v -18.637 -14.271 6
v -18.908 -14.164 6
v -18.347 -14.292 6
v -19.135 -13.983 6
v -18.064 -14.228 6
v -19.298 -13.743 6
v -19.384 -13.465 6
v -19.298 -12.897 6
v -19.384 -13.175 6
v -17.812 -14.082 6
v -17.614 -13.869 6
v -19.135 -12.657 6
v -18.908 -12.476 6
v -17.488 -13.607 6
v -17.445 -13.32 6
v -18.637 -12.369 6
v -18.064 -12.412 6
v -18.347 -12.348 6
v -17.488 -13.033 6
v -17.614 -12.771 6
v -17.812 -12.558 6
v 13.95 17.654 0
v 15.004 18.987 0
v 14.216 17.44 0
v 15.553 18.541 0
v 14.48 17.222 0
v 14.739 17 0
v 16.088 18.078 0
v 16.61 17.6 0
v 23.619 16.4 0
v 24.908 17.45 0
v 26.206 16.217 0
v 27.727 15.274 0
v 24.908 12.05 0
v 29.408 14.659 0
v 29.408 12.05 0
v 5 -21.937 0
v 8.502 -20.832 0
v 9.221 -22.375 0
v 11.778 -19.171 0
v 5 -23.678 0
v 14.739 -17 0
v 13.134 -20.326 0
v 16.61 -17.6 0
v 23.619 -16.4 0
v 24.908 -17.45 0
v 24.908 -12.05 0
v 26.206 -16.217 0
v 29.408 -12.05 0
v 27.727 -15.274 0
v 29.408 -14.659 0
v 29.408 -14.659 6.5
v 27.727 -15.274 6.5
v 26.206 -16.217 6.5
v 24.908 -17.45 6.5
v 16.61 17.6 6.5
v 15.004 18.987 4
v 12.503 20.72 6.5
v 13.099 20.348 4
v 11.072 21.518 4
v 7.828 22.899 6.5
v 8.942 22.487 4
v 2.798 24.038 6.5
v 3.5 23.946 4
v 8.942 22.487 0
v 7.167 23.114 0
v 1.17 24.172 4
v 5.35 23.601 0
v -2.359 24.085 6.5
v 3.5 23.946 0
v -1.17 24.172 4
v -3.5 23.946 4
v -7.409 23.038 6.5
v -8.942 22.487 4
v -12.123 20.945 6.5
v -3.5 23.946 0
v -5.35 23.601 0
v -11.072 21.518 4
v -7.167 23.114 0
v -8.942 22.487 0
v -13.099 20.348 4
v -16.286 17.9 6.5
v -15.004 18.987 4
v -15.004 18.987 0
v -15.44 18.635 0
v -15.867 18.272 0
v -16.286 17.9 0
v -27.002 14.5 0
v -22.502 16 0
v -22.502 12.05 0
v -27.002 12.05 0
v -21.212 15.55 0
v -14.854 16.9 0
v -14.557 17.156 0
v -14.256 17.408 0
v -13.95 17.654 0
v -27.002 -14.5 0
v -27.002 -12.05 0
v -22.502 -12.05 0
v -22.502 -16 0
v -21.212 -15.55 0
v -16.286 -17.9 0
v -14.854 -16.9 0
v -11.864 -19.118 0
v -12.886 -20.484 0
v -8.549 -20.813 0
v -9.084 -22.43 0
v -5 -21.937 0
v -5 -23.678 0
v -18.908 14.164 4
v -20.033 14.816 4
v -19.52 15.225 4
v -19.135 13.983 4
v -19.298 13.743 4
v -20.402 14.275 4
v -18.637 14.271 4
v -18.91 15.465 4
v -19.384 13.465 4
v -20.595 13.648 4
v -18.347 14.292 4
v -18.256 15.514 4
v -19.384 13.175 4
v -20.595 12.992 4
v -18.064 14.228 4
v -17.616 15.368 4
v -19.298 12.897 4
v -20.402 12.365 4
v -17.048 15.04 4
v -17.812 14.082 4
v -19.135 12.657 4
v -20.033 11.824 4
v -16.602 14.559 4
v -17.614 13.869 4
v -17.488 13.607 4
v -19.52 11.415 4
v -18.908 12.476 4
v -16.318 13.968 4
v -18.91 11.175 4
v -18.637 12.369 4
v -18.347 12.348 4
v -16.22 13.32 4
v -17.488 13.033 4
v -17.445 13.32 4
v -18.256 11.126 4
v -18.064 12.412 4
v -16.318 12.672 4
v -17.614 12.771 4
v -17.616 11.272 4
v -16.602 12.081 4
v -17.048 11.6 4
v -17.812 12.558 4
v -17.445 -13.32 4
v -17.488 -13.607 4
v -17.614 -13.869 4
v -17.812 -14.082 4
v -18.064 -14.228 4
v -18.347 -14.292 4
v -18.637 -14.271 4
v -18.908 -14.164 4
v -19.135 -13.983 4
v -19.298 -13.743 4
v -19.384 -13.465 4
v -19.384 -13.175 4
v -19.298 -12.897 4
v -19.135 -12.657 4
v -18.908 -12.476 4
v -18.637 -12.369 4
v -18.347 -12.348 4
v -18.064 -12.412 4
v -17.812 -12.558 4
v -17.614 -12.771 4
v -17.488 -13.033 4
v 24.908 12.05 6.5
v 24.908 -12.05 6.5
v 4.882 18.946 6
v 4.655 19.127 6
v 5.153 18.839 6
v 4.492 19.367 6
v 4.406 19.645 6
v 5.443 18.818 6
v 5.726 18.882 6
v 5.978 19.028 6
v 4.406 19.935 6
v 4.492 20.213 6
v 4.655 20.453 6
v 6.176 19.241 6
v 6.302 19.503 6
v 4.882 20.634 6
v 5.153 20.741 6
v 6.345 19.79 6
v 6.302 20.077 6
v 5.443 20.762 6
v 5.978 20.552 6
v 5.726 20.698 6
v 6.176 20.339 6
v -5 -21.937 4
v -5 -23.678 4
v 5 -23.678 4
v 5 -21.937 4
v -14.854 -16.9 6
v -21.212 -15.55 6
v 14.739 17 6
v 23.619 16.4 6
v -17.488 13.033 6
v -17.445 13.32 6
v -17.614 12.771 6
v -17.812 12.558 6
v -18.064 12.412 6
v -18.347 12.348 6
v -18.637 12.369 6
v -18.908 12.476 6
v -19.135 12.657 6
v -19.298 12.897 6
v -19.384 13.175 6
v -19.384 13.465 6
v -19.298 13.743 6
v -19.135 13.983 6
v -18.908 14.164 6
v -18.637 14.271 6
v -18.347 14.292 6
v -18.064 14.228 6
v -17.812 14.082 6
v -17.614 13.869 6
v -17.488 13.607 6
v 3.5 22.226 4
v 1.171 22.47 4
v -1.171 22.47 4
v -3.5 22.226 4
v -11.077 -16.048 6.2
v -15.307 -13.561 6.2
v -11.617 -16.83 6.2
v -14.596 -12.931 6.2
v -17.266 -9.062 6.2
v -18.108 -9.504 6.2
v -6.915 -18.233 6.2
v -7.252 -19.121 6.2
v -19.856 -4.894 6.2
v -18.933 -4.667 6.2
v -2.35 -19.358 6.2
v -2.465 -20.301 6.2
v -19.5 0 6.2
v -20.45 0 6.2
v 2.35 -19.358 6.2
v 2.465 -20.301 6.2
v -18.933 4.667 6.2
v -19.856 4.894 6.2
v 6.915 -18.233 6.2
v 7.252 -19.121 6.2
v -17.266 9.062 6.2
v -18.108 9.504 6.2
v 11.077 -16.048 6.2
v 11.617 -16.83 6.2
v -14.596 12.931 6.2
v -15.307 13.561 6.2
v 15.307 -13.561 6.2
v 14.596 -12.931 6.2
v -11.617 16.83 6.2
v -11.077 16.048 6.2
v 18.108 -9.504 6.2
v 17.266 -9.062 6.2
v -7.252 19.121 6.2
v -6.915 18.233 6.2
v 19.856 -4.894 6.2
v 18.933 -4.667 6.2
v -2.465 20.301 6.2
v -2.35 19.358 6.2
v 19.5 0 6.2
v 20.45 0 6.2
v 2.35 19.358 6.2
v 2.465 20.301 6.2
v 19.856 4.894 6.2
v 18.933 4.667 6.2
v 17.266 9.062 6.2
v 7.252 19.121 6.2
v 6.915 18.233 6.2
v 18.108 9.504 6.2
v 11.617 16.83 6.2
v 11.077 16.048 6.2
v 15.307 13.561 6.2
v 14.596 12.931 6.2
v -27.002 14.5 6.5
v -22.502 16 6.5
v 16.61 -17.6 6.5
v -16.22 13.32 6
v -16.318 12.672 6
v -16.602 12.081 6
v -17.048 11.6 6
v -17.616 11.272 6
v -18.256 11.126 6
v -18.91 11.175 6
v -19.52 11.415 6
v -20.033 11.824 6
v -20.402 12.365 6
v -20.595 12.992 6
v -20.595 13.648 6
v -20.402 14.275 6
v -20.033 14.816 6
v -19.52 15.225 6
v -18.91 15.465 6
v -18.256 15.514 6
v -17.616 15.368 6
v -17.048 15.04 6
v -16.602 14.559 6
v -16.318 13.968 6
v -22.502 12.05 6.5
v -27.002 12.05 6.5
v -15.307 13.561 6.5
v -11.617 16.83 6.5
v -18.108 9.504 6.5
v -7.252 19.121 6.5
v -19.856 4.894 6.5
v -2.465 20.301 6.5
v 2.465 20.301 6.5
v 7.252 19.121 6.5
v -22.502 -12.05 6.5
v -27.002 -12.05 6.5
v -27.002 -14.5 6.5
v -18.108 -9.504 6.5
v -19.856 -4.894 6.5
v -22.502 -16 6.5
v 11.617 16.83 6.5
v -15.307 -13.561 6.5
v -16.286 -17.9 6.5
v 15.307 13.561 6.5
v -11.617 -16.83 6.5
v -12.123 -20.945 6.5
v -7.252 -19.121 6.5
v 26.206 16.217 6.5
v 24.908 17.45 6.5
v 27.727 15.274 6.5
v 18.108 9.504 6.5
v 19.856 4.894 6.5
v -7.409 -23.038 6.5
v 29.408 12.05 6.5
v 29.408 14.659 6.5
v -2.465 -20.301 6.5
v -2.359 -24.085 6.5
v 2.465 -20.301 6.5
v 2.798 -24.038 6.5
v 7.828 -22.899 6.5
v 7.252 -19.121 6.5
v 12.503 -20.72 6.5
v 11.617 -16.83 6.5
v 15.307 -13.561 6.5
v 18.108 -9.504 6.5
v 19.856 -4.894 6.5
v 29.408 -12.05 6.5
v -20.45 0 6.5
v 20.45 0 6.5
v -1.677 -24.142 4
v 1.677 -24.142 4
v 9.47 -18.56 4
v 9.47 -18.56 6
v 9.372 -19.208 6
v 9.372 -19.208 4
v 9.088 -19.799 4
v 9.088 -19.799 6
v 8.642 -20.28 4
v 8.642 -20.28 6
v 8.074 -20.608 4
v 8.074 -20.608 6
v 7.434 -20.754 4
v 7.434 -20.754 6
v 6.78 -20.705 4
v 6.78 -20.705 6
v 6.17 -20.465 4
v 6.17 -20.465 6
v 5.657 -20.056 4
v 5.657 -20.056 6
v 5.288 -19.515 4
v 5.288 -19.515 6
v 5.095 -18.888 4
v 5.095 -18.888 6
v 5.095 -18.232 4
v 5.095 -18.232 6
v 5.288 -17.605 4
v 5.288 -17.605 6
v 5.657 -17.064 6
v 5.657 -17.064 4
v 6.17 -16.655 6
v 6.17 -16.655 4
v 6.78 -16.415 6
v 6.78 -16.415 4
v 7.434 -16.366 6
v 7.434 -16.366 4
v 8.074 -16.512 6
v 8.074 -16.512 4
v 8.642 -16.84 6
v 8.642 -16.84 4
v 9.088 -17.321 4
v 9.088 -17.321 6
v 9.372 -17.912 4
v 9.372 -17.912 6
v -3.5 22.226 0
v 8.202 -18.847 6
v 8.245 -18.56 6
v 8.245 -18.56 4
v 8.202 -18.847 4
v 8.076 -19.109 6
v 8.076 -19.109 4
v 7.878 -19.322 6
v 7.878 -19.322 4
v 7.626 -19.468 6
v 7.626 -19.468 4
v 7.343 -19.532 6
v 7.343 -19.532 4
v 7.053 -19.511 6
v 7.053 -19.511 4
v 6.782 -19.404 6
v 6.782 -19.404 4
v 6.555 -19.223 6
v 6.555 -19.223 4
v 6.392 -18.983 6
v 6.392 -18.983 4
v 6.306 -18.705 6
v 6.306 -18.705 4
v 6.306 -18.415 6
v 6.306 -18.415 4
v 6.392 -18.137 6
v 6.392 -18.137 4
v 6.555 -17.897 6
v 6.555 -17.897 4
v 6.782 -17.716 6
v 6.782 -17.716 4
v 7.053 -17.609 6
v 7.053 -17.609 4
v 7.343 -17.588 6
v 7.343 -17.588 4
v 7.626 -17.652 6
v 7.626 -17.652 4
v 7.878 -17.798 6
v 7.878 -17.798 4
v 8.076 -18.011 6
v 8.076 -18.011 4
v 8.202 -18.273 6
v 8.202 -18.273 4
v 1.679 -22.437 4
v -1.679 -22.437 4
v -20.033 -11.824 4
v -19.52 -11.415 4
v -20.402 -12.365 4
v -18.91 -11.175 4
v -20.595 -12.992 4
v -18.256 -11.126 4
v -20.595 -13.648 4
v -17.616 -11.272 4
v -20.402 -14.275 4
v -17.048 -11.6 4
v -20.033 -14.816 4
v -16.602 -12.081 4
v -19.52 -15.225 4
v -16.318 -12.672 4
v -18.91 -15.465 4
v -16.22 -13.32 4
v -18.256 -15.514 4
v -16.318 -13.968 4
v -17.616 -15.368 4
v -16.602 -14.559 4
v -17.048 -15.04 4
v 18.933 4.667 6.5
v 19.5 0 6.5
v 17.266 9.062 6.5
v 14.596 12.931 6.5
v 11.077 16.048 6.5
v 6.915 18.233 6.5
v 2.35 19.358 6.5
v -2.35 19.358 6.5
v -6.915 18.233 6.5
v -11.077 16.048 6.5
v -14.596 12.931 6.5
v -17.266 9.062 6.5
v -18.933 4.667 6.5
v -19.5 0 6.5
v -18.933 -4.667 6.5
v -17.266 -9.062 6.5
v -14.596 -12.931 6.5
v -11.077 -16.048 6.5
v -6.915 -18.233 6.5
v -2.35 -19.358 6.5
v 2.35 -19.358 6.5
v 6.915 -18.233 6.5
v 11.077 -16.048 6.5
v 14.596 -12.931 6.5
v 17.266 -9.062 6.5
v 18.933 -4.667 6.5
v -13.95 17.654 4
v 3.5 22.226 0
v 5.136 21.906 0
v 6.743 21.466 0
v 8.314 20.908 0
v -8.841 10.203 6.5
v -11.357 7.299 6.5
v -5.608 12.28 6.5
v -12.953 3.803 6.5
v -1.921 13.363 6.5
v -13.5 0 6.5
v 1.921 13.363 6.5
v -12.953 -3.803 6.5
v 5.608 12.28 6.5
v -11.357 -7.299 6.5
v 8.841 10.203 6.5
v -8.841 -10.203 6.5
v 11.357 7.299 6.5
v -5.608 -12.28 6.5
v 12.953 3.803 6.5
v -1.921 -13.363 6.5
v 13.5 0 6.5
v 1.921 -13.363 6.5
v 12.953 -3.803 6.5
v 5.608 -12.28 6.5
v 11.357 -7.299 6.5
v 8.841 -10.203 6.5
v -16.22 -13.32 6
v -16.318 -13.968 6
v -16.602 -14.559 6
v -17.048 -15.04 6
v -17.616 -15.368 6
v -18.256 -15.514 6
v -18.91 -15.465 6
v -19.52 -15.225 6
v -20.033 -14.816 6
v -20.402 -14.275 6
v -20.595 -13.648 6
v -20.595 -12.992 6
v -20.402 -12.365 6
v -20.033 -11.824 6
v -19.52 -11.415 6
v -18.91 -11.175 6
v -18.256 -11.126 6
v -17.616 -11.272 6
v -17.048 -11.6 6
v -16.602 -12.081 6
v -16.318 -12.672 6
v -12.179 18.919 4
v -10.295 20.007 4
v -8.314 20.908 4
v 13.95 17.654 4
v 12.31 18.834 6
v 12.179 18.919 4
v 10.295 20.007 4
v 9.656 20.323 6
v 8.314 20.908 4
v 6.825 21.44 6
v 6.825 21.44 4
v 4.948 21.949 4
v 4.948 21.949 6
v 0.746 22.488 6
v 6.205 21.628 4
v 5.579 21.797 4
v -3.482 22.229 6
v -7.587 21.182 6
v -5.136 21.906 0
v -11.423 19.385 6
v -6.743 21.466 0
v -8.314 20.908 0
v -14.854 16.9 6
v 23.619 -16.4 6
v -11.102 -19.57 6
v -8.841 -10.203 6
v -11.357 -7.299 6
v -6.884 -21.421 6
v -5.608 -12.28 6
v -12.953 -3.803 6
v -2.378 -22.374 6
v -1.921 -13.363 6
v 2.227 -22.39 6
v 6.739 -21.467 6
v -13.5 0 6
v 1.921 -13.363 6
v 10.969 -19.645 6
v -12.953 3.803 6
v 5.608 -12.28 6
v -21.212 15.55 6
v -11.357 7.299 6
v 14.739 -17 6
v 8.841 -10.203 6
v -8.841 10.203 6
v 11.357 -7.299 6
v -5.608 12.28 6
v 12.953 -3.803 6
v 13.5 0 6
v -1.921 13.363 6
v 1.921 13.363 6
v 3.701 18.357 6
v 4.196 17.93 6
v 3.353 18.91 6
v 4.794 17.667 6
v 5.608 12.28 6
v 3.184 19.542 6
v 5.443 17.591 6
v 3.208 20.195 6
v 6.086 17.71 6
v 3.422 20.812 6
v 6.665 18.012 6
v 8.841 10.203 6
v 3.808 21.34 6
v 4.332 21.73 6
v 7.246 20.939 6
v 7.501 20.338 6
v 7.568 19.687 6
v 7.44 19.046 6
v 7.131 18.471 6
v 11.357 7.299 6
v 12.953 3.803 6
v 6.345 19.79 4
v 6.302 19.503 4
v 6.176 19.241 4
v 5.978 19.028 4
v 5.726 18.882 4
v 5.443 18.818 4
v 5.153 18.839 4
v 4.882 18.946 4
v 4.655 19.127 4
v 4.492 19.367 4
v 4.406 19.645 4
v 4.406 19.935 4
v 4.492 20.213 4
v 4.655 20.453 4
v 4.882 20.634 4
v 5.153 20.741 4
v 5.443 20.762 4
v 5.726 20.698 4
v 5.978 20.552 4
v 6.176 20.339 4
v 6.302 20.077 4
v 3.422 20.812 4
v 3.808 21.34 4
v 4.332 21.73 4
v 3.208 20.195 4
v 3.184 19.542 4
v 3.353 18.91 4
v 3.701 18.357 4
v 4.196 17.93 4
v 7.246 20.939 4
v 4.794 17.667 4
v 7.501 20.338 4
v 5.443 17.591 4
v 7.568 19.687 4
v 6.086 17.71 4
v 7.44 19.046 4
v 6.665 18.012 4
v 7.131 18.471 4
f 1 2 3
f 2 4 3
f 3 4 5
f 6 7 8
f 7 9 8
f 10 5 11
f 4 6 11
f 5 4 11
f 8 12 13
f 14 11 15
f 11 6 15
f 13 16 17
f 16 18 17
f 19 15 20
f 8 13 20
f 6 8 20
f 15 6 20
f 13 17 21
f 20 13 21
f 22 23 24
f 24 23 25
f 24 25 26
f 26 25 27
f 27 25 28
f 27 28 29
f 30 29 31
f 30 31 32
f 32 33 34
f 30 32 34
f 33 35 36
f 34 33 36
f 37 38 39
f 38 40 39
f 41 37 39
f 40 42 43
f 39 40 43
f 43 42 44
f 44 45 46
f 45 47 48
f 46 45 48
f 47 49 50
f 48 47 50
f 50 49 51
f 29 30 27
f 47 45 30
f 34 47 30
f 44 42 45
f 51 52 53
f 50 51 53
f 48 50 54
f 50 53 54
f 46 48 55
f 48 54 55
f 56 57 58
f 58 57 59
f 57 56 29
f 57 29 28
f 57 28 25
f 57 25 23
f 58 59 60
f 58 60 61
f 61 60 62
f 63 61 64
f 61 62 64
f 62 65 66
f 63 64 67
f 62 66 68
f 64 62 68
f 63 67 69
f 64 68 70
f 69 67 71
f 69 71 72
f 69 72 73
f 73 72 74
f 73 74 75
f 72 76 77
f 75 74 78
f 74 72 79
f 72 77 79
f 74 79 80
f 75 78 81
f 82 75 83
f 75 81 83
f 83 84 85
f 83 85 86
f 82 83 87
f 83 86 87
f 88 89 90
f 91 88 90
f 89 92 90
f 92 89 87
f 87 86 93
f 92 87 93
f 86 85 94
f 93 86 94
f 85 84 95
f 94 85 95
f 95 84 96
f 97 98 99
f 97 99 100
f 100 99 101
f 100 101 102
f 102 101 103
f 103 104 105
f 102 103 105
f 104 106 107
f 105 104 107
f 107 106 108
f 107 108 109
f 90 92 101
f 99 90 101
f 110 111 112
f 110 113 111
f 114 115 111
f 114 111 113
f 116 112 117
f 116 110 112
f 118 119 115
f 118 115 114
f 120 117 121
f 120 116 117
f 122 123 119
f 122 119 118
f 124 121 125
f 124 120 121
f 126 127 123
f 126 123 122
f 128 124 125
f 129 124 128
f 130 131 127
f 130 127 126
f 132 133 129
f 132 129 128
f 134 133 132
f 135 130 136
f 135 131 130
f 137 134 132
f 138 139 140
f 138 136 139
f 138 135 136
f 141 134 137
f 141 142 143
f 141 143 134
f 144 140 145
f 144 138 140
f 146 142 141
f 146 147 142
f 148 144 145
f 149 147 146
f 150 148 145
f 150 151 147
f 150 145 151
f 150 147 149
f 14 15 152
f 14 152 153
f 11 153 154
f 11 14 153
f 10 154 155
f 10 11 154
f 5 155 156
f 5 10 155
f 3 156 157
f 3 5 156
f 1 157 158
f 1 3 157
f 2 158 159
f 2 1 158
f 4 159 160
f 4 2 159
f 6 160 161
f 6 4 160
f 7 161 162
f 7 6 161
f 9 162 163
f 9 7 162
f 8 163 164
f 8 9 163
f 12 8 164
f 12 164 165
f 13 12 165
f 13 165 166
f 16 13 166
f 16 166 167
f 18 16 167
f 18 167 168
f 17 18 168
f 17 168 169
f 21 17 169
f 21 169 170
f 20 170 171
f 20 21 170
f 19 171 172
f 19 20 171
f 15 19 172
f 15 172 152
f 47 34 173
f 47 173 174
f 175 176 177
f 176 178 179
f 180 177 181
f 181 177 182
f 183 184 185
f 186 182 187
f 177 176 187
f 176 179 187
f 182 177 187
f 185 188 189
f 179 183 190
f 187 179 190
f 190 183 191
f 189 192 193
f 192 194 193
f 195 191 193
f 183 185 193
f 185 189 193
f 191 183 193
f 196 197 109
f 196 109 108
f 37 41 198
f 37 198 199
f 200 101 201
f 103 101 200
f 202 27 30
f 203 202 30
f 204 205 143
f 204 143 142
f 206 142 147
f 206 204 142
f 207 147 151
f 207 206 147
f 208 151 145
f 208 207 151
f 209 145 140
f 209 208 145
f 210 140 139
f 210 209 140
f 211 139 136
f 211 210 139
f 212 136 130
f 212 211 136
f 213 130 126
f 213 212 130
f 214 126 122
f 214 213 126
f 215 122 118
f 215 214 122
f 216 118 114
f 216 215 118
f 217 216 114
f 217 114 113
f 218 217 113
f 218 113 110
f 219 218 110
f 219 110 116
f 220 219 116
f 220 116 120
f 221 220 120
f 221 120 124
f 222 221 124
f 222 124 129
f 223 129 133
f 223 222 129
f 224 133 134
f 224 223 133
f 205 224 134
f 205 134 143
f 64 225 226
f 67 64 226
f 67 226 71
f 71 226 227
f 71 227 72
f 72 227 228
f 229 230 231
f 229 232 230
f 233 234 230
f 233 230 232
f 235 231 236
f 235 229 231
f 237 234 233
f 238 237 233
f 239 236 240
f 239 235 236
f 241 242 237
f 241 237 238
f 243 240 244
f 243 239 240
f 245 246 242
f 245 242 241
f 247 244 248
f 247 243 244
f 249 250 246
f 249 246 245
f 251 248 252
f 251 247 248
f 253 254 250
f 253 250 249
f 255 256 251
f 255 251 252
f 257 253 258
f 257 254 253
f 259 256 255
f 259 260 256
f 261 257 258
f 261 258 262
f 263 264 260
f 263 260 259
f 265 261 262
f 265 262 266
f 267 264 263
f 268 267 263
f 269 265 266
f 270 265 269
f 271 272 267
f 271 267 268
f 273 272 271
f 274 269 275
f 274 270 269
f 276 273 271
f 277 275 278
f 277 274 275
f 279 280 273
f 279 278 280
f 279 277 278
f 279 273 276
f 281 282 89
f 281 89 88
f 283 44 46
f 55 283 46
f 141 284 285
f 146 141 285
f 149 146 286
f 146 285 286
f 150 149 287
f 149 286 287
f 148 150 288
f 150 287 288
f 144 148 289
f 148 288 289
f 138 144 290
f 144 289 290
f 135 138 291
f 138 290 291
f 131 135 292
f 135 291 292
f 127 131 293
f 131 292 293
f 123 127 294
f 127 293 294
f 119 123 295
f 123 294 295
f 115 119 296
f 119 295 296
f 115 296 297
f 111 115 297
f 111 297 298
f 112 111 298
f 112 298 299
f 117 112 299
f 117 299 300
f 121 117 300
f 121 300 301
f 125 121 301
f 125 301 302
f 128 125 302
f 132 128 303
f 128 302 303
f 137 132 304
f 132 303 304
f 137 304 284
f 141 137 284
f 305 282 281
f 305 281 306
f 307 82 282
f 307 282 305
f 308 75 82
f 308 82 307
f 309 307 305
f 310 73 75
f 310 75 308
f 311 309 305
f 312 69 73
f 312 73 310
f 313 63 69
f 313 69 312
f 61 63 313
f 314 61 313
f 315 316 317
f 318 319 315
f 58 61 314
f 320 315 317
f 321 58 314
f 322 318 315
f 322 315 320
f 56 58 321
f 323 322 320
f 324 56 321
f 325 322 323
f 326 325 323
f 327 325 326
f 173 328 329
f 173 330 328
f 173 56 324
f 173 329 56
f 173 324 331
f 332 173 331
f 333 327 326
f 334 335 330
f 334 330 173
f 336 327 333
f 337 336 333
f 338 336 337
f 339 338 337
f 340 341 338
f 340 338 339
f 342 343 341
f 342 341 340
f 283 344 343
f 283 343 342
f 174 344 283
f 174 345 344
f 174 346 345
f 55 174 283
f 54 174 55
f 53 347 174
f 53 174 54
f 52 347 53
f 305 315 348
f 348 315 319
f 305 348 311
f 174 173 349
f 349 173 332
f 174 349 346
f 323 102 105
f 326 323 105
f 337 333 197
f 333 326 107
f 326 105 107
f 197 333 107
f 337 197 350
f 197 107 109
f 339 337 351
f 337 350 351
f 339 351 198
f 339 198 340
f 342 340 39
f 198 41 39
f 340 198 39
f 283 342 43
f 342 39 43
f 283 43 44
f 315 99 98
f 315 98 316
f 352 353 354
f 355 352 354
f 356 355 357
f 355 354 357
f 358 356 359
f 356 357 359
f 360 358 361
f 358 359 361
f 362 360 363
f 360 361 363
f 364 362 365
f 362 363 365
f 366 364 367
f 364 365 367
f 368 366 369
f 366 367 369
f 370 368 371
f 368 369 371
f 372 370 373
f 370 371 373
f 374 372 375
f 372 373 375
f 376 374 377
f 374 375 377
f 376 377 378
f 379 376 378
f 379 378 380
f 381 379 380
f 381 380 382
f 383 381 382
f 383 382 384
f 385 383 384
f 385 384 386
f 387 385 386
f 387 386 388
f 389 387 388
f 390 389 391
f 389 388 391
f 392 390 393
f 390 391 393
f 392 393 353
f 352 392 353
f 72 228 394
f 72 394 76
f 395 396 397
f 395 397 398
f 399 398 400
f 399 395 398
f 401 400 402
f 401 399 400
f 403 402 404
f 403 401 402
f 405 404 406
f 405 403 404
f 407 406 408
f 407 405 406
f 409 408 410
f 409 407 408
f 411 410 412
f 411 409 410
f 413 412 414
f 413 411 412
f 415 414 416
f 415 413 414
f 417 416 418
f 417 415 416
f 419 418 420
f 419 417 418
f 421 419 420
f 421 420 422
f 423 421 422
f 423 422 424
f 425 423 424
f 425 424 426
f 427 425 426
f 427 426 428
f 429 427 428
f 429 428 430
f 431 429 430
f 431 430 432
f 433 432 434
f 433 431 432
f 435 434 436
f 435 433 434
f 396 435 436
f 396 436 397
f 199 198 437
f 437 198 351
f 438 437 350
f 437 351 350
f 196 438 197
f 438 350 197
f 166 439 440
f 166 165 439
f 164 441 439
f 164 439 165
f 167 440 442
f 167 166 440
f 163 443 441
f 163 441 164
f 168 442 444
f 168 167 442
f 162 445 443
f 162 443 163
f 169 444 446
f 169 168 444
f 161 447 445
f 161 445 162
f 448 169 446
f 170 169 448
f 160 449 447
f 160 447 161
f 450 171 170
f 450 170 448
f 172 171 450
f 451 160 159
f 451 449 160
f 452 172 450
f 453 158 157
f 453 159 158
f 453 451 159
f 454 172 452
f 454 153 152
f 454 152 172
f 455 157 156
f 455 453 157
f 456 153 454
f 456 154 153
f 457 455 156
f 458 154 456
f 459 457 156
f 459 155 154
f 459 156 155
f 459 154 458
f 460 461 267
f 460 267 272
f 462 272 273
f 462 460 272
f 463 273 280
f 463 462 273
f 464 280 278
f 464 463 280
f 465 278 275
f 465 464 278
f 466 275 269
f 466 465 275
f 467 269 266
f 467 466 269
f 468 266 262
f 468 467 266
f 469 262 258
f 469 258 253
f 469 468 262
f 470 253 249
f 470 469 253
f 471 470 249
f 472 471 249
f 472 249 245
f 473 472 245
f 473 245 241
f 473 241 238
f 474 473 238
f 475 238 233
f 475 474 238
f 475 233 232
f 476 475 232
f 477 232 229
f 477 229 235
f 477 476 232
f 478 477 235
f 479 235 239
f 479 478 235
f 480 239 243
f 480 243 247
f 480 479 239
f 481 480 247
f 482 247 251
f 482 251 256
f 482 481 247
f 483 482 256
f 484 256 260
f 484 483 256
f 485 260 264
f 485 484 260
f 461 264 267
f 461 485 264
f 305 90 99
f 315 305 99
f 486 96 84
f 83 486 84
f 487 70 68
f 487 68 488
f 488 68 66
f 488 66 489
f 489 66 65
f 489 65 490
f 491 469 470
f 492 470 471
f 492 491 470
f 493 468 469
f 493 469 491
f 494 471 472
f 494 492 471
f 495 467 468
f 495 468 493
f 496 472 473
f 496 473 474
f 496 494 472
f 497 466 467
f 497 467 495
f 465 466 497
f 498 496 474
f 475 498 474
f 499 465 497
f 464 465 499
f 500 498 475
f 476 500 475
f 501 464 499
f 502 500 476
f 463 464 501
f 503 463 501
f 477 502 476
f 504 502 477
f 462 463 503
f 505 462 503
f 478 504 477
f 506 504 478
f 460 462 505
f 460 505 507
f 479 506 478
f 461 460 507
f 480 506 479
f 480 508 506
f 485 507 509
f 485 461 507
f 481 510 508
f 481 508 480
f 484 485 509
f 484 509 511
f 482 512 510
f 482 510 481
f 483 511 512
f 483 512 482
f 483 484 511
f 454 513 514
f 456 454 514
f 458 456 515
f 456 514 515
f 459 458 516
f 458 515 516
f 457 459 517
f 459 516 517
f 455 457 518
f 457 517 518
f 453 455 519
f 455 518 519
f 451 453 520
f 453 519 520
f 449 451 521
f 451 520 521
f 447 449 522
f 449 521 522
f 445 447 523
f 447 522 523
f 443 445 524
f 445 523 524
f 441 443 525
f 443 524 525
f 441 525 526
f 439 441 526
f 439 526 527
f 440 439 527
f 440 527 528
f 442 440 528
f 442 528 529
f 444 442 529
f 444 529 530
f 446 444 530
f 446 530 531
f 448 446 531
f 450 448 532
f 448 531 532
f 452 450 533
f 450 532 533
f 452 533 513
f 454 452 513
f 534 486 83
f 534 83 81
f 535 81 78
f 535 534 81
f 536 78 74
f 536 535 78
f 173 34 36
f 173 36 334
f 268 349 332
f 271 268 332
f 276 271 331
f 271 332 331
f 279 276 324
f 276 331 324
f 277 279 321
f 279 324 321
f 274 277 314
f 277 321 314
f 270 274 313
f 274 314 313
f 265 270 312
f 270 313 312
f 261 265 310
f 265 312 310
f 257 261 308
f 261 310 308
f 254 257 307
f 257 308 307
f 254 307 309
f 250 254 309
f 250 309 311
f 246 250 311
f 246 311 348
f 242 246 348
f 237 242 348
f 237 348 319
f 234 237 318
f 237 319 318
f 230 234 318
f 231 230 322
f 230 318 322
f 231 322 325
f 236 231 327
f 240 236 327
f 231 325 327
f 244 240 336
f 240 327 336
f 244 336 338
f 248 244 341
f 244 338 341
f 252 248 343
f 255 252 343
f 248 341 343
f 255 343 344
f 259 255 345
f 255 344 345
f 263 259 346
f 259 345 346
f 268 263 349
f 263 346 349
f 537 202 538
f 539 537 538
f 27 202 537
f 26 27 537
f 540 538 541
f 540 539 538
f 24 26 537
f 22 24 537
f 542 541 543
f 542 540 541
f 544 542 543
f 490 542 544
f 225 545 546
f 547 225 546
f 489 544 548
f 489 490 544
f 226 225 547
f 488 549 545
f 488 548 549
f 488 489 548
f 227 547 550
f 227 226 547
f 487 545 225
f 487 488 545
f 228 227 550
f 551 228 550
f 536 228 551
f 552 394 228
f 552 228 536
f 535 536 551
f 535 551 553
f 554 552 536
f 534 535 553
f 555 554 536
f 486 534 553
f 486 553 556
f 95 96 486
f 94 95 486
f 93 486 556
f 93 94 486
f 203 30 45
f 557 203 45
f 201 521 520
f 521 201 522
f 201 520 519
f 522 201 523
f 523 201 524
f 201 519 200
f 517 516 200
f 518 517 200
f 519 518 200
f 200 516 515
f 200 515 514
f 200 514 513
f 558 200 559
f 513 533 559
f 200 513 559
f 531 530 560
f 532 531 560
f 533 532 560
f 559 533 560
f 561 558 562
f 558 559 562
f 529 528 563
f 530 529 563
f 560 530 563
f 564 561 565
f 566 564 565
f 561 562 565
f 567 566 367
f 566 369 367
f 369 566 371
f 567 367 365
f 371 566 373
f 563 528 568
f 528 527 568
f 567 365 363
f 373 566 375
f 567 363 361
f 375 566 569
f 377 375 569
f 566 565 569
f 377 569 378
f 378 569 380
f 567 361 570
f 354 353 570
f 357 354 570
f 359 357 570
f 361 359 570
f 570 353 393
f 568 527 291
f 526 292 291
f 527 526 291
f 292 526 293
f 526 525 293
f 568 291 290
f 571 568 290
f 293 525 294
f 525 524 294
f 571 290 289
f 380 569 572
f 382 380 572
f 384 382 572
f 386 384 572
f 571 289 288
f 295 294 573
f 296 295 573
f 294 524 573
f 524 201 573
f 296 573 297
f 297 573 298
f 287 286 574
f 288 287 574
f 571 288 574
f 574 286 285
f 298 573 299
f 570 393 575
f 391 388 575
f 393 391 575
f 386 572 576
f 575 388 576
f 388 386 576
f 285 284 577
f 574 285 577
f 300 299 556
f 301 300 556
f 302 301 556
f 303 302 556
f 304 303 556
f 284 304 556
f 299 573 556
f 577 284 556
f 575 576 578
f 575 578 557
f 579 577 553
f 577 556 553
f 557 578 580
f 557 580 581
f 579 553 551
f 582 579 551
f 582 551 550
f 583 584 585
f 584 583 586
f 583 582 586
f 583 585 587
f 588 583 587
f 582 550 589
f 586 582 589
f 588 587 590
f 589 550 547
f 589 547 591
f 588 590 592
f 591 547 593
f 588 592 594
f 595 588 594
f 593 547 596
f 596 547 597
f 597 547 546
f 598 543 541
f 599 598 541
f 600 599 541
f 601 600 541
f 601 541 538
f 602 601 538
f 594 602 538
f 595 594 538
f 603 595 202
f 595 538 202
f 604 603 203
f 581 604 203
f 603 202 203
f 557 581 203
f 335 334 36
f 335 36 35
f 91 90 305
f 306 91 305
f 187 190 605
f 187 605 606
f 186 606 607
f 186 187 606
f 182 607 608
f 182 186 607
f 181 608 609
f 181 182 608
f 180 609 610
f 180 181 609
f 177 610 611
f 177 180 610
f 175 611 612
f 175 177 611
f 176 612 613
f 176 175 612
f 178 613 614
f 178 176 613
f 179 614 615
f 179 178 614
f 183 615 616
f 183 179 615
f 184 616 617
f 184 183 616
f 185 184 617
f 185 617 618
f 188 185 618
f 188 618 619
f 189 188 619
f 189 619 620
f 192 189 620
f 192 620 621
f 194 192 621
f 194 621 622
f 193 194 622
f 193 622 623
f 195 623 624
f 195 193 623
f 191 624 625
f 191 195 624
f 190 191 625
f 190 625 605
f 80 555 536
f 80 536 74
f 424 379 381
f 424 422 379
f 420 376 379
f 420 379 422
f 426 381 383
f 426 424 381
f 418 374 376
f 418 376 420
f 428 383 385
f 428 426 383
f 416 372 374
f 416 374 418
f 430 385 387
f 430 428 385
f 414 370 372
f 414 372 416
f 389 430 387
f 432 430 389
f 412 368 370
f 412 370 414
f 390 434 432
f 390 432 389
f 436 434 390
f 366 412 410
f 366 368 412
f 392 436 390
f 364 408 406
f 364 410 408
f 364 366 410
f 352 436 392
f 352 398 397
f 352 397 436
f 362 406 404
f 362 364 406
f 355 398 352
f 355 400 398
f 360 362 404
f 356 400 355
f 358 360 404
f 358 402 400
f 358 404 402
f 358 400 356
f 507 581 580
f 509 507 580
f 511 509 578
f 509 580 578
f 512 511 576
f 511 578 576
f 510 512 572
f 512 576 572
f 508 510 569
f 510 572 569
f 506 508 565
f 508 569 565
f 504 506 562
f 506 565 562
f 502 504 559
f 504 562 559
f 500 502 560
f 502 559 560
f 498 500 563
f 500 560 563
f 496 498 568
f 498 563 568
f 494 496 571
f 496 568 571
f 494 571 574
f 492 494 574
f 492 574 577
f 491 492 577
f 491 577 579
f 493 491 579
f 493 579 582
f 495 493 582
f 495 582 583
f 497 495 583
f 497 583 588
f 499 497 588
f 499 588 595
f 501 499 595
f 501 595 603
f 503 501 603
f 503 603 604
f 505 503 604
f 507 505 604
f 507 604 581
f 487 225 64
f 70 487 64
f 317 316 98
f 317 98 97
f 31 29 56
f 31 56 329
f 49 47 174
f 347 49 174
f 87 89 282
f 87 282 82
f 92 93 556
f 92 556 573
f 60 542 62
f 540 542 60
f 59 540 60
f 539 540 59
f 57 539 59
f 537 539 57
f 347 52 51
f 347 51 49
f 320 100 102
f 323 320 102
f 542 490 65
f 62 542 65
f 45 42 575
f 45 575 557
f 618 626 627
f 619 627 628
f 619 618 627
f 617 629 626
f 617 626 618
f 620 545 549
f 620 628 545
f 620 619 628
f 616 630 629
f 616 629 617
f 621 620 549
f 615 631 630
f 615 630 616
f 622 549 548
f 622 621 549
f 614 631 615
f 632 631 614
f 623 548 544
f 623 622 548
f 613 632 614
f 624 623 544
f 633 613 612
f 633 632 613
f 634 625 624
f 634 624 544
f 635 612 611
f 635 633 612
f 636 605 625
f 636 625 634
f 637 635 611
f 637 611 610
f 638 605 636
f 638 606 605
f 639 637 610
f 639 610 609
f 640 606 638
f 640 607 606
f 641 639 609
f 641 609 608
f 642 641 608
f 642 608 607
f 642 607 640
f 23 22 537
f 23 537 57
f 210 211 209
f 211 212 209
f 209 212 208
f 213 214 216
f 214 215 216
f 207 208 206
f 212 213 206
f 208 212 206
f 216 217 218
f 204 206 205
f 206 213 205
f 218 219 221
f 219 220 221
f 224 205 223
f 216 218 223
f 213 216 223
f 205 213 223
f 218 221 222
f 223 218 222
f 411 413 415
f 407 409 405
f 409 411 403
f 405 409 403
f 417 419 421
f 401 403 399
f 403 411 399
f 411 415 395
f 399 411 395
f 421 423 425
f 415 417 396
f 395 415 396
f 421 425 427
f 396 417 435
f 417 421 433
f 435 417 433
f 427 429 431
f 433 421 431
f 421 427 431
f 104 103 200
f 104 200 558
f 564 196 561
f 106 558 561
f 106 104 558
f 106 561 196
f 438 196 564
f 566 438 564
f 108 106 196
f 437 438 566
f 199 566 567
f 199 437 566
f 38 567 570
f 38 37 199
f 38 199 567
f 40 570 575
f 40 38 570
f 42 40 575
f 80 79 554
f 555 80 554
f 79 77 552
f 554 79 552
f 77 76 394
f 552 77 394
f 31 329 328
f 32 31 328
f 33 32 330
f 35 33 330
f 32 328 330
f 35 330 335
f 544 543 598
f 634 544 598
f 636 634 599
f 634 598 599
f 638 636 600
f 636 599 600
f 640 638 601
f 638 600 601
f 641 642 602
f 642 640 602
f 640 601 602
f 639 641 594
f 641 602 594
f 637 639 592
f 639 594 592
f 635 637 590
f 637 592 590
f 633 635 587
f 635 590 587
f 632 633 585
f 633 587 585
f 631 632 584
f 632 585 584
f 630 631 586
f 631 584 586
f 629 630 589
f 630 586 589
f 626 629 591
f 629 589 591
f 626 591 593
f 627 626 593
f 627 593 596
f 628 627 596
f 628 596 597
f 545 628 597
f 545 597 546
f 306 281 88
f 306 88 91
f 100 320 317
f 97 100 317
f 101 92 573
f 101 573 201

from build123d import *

# Parameters (mm, degrees)
PAD_DEPTH       = 6.5
POCKET_DEPTH    = 6
SKETCH002_R     = 13.5
POCKET001_DEPTH = 1
SKETCH003_W     = 5.4
SKETCH003_H     = 6.5
PAD001_DEPTH    = 4.5
POCKET002_DEPTH = 10
SKETCH010_W     = 3.95
SKETCH010_H     = 6.5
PAD002_DEPTH    = 4.5
POCKET005_DEPTH = 10
SKETCH012_R     = 0.6
POCKET006_DEPTH = 2
SKETCH014_R     = 20.45
SKETCH014_R_2   = 19.5
POCKET008_DEPTH = 0.3
SKETCH015_R     = 2.2
SKETCH015_R_2   = 0.975
PAD003_DEPTH    = 2
POCKET009_DEPTH = 4
POCKET010_DEPTH = 4


with BuildPart() as part:
    # Sketch → Pad (new body)
    with BuildSketch(Plane.XY):
        with BuildLine():
            Line((-22.5019915649, 16), (-22.5019915649, -16))
            Line((-22.5019915649, -16), (-16.2858834577, -17.9000000001))
            ThreePointArc((-16.2858834577, -17.9000000001), (0.2206895737, -24.1989937004), (16.6096357576, -17.5999999999))
            Line((16.6096357576, -17.5999999999), (24.9082802252, -17.45))
            Line((24.9082802252, 17.45), (24.9082802252, -17.45))
            Line((16.6096357576, 17.6), (24.9082802252, 17.45))
            ThreePointArc((16.6096357576, 17.6), (0.2206895736, 24.1989937004), (-16.2858834578, 17.9))
            Line((-22.5019915649, 16), (-16.2858834578, 17.9))
        make_face()
    extrude(amount=PAD_DEPTH)

    # Sketch001 → Pocket (cut)
    with BuildSketch(Plane.XY):
        with BuildLine():
            Line((-14.8539557021, 16.9), (-21.2122180433, 15.55))
            Line((-21.2122180433, 15.55), (-21.2122180433, -15.55))
            Line((-21.2122180433, -15.55), (-14.8539557021, -16.9))
            ThreePointArc((-14.8539557021, -16.9), (-0.0760301383, -22.4998715423), (14.739402973, -17))
            Line((14.739402973, -17), (23.6191552218, -16.4))
            Line((23.6191552218, 16.4), (23.6191552218, -16.4))
            Line((14.739402973, 17), (23.6191552218, 16.4))
            ThreePointArc((14.739402973, 17), (-0.0760301383, 22.4998715423), (-14.8539557021, 16.9))
        make_face()
    extrude(amount=POCKET_DEPTH, mode=Mode.SUBTRACT)

    # Sketch002 (on Face19 of Pocket) → Pocket001 (cut)
    with BuildSketch(Plane(origin=(0, 0, 6), x_dir=(1, 0, 0), z_dir=(0, 0, -1))):
        Circle(SKETCH002_R)
    extrude(amount=-POCKET001_DEPTH, mode=Mode.SUBTRACT)

    # Sketch003 (on Face7 of Pad) → Pad001 (join)
    with BuildSketch(Plane.YZ.offset(24.9082802252)):
        with Locations((-14.75, 3.25)):
            Rectangle(SKETCH003_W, SKETCH003_H)
        with Locations((14.75, 3.25)):
            Rectangle(SKETCH003_W, SKETCH003_H)
    extrude(amount=PAD001_DEPTH)

    # Sketch006 (on Face22 of Pad001) → Pocket002 (cut)
    with BuildSketch(Plane.XY.offset(6.5)):
        with BuildLine():
            ThreePointArc((24.9082802252, 17.45), (26.9423471239, 15.7065020586), (29.4082802252, 14.6594169811))
            Line((29.4082802252, 17.45), (29.4082802252, 14.6594169811))
            Line((29.4082802252, 17.45), (24.9082802252, 17.45))
        make_face()
        with BuildLine():
            ThreePointArc((29.4082802252, -14.6594169811), (26.9423471239, -15.7065020586), (24.9082802252, -17.45))
            Line((29.4082802252, -17.45), (24.9082802252, -17.45))
            Line((29.4082802252, -14.6594169811), (29.4082802252, -17.45))
        make_face()
    extrude(amount=-POCKET002_DEPTH, mode=Mode.SUBTRACT)

    # Sketch010 (on Face3 of Pad) → Pad002 (join)
    with BuildSketch(Plane(origin=(-22.5019915649, 0, 0), x_dir=(0, -1, 0), z_dir=(-1, 0, 0))):
        with Locations((-14.025, 3.25)):
            Rectangle(SKETCH010_W, SKETCH010_H)
        with Locations((14.025, 3.25)):
            Rectangle(SKETCH010_W, SKETCH010_H)
    extrude(amount=PAD002_DEPTH)

    # Sketch011 (on Face28 of Pad002) → Pocket005 (cut)
    with BuildSketch(Plane.XY.offset(6.5)):
        Polygon((-27.0019915649, 16), (-22.5019915649, 16), (-27.0019915649, 14.5), align=None)
        Polygon((-22.5019915649, -16), (-27.0019915649, -14.5), (-27.0019915649, -16), align=None)
    extrude(amount=-POCKET005_DEPTH, mode=Mode.SUBTRACT)

    # Sketch012 (on Face23 of Pocket005) → Pocket006 (cut)
    with BuildSketch(Plane(origin=(23.6191552218, 0, 0), x_dir=(0, -1, 0), z_dir=(-1, 0, 0))):
        with Locations((12.9594169811, 8.2)):
            Circle(SKETCH012_R)
    extrude(amount=-POCKET006_DEPTH, mode=Mode.SUBTRACT)

    # Sketch014 (on Face10 of Pad) → Pocket008 (cut)
    with BuildSketch(Plane.XY.offset(6.5)):
        Circle(SKETCH014_R)
        Circle(SKETCH014_R_2, mode=Mode.SUBTRACT)
    extrude(amount=-POCKET008_DEPTH, mode=Mode.SUBTRACT)

    # Sketch015 (on Face19 of Pocket) → Pad003 (join)
    with BuildSketch(Plane(origin=(0, 0, 6), x_dir=(1, 0, 0), z_dir=(0, 0, -1))):
        with Locations((-18.42, 13.32)):
            Circle(SKETCH015_R)
        with Locations((-18.42, 13.32)):
            Circle(SKETCH015_R_2, mode=Mode.SUBTRACT)
        with Locations((7.27, 18.56)):
            Circle(SKETCH015_R)
        with Locations((7.27, 18.56)):
            Circle(SKETCH015_R_2, mode=Mode.SUBTRACT)
        with Locations((5.37, -19.79)):
            Circle(SKETCH015_R)
        with Locations((5.37, -19.79)):
            Circle(SKETCH015_R_2, mode=Mode.SUBTRACT)
        with Locations((-18.42, -13.32)):
            Circle(SKETCH015_R)
        with Locations((-18.42, -13.32)):
            Circle(SKETCH015_R_2, mode=Mode.SUBTRACT)
    extrude(amount=PAD003_DEPTH)

    # Sketch016 → Pocket009 (cut)
    with BuildSketch(Plane(origin=(0, 0, 0), x_dir=(-1, 0, 0), z_dir=(0, 0, 1))):
        with BuildLine():
            Line((-5, 23.6778377391), (-5, 21.9374109685))
            ThreePointArc((5, 21.9374109685), (0, 22.5), (-5, 21.9374109685))
            Line((5, 23.6778377391), (5, 21.9374109685))
            ThreePointArc((5, 23.6778377391), (0, 24.2), (-5, 23.6778377391))
        make_face()
    extrude(amount=POCKET009_DEPTH, mode=Mode.SUBTRACT)

    # Sketch017 → Pocket010 (cut)
    with BuildSketch(Plane(origin=(0, 0, 0), x_dir=(-1, 0, 0), z_dir=(0, 0, 1))):
        with BuildLine():
            Line((-3.499984119, -22.2261132717), (-3.5, -23.9455632634))
            ThreePointArc((-3.5, -23.9455632634), (0, -24.2000019575), (3.5, -23.9455632634))
            Line((3.5000158811, -22.2261082701), (3.5, -23.9455632634))
            ThreePointArc((-3.499984119, -22.2261132717), (1.60767e-05, -22.5), (3.5000158811, -22.2261082701))
        make_face()
        with BuildLine():
            ThreePointArc((-13.9498796389, -17.6536358312), (-11.25, -19.4855715851), (-8.3135572795, -20.9077680626))
            Line((-8.3135572795, -20.9077680626), (-8.9416927184, -22.487466094))
            ThreePointArc((-15.0038705449, -18.987466094), (-12.1, -20.9578147716), (-8.9416927184, -22.487466094))
            Line((-13.9498796389, -17.6536358312), (-15.0038705449, -18.987466094))
        make_face()
        with BuildLine():
            ThreePointArc((8.3135572795, -20.9077680626), (11.25, -19.4855715851), (13.9498796389, -17.6536358312))
            Line((13.9498796389, -17.6536358312), (15.0038705449, -18.987466094))
            ThreePointArc((8.9416927184, -22.487466094), (12.1, -20.9578147716), (15.0038705449, -18.987466094))
            Line((8.3135572795, -20.9077680626), (8.9416927184, -22.487466094))
        make_face()
    extrude(amount=POCKET010_DEPTH, mode=Mode.SUBTRACT)


solid = part.part
